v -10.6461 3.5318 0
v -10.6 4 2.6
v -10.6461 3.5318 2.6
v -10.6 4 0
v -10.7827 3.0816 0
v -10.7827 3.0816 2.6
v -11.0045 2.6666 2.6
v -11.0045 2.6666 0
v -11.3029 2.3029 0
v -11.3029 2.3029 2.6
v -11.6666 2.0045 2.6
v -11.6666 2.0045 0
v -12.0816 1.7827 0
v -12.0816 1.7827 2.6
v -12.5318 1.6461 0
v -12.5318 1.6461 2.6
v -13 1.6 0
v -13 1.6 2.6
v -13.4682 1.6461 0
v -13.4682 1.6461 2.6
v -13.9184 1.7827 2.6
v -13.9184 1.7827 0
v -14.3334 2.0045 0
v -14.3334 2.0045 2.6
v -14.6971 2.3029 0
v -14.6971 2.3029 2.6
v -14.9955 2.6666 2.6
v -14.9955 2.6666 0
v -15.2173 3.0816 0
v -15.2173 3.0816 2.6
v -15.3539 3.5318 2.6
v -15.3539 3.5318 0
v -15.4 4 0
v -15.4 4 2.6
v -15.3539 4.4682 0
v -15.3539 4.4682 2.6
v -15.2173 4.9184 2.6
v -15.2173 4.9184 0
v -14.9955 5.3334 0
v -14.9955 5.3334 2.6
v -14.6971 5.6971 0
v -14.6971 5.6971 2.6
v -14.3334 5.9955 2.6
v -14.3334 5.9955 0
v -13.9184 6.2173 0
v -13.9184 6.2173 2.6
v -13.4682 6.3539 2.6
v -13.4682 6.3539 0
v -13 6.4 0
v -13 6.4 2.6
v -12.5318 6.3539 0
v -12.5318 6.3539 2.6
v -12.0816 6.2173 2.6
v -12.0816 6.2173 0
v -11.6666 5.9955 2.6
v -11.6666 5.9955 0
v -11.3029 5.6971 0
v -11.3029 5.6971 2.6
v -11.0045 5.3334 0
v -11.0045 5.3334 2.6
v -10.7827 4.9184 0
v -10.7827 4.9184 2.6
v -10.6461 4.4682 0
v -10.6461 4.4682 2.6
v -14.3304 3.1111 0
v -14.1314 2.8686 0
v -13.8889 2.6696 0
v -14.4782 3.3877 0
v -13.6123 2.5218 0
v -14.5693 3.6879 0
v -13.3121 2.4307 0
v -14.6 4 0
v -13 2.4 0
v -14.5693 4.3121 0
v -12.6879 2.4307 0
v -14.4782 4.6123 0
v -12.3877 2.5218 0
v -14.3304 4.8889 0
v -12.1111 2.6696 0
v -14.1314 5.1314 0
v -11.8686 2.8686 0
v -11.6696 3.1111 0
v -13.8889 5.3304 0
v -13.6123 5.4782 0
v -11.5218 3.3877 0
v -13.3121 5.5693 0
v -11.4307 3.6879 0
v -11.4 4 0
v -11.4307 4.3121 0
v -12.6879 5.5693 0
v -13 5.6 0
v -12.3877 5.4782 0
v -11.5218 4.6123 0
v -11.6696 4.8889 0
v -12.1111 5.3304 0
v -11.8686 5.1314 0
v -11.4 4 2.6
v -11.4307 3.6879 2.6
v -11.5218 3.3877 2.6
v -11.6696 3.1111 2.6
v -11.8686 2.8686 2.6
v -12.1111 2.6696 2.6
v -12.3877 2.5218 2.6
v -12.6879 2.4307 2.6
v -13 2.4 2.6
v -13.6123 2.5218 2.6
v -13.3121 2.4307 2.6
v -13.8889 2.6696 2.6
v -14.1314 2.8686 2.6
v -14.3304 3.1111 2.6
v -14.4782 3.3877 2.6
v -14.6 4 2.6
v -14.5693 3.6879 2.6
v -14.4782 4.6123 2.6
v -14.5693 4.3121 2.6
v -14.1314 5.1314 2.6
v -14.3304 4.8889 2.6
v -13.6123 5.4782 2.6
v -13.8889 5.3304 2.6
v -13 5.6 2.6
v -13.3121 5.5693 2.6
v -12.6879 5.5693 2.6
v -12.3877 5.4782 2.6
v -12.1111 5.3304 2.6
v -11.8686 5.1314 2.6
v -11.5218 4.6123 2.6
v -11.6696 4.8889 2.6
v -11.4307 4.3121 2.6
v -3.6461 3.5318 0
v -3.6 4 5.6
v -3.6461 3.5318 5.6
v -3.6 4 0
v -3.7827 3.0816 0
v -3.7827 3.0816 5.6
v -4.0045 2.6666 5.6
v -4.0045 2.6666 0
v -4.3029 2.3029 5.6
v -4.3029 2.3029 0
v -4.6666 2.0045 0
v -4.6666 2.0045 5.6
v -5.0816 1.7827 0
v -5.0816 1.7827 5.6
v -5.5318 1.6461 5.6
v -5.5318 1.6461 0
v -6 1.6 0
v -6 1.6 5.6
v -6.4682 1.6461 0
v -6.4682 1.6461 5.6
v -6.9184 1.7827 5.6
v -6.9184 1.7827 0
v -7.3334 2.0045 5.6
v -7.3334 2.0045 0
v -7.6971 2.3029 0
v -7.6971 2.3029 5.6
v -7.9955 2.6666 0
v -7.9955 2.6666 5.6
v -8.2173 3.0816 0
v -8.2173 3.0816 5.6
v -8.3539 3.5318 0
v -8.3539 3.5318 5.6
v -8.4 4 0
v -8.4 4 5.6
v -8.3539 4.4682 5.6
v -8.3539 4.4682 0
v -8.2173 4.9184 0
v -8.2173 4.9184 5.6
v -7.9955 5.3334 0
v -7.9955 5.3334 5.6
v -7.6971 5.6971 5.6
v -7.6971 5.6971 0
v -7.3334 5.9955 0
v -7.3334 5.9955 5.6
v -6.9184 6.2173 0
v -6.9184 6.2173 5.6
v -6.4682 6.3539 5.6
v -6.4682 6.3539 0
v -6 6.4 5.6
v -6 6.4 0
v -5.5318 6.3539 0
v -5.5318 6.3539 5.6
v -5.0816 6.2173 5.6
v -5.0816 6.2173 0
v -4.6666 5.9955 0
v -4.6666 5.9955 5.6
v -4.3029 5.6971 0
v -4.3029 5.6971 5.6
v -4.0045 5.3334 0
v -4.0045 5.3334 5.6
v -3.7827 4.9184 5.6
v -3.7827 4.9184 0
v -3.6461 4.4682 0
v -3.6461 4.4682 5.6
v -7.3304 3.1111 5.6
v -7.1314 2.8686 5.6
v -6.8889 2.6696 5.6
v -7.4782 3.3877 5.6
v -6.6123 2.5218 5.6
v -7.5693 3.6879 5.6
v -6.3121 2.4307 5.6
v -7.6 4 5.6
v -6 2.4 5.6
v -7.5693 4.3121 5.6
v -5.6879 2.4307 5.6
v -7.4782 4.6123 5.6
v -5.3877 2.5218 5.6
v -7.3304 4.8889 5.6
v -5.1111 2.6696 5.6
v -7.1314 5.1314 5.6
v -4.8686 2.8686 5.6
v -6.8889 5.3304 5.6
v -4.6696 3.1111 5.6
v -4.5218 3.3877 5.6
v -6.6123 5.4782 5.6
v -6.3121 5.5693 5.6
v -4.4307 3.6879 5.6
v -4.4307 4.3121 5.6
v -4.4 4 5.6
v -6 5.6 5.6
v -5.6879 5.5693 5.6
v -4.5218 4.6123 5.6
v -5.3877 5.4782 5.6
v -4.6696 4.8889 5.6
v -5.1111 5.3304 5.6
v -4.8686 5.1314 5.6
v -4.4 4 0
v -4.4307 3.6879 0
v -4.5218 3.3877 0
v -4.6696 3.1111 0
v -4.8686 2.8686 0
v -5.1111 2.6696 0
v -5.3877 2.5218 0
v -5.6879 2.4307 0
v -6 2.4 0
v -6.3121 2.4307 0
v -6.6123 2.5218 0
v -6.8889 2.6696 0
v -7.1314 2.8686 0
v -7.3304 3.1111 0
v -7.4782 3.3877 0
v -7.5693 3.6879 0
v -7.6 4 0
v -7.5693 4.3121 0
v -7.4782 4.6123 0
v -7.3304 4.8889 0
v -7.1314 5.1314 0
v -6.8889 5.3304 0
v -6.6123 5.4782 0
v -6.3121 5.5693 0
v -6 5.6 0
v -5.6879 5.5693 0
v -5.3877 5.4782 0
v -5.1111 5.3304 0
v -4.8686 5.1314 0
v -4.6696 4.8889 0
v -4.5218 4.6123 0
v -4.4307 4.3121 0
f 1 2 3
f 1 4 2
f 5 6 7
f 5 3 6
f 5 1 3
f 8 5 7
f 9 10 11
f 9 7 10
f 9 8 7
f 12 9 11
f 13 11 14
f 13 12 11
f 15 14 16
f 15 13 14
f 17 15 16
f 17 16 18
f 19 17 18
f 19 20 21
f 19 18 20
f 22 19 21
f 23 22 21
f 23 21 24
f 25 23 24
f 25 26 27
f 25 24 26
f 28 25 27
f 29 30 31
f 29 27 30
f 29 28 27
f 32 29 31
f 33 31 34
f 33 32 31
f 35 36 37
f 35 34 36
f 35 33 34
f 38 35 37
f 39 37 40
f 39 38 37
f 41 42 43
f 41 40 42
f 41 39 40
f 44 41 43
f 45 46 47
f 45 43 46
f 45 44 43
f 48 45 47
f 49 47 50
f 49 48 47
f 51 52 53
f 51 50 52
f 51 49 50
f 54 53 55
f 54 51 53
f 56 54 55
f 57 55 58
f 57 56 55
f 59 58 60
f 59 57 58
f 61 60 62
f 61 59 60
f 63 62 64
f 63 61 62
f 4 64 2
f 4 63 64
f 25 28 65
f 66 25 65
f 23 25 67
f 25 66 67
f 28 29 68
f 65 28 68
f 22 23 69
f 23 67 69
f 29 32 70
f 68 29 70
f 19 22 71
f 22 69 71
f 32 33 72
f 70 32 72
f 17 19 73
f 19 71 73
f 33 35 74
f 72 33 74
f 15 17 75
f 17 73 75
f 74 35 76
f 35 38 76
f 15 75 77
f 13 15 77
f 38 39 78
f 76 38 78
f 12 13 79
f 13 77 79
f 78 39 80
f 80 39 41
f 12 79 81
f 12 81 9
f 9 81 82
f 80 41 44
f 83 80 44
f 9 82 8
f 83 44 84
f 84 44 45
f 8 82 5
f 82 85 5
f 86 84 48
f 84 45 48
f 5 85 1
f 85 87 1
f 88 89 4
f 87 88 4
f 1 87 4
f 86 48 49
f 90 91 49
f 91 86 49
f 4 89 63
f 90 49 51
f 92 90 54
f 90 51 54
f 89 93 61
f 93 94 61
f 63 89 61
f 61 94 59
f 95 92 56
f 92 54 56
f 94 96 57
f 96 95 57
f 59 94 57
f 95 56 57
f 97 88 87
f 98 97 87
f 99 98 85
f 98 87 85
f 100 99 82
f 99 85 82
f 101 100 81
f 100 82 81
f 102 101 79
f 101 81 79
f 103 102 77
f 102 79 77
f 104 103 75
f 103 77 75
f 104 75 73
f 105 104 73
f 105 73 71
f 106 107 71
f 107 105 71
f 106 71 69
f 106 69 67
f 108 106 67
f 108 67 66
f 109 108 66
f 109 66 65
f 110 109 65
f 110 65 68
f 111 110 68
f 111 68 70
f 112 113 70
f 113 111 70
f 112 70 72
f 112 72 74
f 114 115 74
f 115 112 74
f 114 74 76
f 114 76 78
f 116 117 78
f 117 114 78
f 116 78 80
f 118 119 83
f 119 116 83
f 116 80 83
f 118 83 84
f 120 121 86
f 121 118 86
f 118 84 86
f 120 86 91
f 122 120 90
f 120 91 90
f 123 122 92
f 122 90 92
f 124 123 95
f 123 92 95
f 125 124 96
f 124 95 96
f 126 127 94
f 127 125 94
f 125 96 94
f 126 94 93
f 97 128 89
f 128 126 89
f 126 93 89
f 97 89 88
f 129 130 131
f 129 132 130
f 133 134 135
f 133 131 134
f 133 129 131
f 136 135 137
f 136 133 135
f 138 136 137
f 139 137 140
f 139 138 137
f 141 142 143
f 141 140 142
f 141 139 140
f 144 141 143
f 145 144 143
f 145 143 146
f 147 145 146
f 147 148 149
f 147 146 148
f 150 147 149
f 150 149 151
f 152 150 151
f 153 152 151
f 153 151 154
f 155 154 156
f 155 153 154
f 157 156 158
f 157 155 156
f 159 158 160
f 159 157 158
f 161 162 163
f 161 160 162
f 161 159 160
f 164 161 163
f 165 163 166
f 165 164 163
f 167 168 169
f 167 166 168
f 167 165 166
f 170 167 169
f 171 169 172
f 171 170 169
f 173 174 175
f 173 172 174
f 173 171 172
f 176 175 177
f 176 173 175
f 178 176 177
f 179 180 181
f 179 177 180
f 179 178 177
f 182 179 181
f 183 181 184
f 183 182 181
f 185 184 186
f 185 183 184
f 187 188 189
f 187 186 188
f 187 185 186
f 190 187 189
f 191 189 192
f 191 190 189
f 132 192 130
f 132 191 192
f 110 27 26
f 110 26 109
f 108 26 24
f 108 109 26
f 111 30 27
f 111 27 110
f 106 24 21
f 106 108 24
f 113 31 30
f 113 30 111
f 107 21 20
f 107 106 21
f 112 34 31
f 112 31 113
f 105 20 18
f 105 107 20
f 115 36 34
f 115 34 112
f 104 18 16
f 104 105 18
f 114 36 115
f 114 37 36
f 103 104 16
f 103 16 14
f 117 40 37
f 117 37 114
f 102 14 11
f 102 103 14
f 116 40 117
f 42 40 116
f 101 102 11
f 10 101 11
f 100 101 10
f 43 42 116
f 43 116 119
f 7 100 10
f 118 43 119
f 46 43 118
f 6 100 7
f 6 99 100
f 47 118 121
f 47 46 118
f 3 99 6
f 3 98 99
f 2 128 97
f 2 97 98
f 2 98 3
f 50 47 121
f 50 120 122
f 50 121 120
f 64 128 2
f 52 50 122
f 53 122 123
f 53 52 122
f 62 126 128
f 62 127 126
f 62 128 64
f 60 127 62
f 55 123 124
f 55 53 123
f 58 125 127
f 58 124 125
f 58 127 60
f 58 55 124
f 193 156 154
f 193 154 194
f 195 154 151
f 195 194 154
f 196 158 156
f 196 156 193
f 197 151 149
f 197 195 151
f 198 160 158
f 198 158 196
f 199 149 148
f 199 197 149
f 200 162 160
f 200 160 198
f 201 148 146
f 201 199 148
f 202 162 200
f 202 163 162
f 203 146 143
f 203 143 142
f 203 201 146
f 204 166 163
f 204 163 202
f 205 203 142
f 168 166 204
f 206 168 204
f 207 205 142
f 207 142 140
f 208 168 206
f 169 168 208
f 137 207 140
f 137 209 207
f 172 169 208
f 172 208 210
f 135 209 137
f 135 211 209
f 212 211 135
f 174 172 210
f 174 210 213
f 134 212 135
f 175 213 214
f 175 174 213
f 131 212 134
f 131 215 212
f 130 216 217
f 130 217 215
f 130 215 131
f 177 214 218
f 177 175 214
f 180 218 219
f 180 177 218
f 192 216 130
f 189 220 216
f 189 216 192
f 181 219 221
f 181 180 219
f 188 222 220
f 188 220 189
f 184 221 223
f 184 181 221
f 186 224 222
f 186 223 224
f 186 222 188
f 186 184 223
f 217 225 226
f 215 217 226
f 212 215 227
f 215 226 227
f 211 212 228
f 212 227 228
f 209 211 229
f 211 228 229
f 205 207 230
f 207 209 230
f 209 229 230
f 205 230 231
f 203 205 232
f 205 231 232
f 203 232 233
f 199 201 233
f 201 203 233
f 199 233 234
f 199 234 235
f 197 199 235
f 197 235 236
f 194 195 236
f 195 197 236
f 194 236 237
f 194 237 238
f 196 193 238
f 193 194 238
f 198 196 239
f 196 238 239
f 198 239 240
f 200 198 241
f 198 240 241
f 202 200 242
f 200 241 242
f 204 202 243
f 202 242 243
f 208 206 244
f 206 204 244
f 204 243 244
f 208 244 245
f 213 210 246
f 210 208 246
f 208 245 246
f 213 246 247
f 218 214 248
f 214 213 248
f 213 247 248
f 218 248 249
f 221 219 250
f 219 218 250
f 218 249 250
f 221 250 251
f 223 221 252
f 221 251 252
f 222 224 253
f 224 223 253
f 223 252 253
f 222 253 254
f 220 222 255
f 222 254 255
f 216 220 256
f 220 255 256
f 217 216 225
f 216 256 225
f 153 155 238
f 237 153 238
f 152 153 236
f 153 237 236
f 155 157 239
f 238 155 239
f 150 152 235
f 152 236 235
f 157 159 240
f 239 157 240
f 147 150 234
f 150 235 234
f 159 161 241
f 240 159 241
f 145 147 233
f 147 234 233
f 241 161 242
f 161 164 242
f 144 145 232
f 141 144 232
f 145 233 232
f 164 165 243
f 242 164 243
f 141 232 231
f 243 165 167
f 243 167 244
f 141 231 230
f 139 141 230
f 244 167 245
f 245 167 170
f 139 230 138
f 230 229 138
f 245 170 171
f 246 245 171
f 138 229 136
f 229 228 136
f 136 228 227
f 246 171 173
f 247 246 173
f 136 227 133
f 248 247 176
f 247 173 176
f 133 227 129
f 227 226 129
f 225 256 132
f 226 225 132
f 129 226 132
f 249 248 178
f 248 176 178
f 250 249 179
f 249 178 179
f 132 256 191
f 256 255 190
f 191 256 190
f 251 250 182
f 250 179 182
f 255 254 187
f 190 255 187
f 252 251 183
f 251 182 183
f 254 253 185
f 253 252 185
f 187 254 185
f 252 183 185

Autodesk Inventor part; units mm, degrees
ref_plane "YZ Plane" through (0, 0, 0) normal (1, 0, 0) x (0, 1, 0)
ref_plane "XZ Plane" through (0, 0, 0) normal (0, 1, 0) x (-1, 0, 0)
ref_plane "XY Plane" through (0, 0, 0) normal (0, 0, 1) x (1, 0, 0)
sketch "Sketch1" plane through (0, 0, 0) normal (0, 0, 1) x (1, 0, 0)
  circle A0 centre (-6, 4) radius 1.6
  circle A1 centre (-6, 4) radius 2.4
  circle A2 centre (-13, 4) radius 1.6
  circle A3 centre (-13, 4) radius 2.4
  point P0 (0, 0)
  dimension "d0" = 3.2
  dimension "d1" = 4.8
  dimension "d2" = 3.2
  dimension "d3" = 4.8
extrude "Extrusion1" add sketch "Sketch1" along normal blind 2.6 contours A3
extrude "Extrusion2" add sketch "Sketch1" along normal blind 5.6 contours A1
properties part number "spacer_v1"
